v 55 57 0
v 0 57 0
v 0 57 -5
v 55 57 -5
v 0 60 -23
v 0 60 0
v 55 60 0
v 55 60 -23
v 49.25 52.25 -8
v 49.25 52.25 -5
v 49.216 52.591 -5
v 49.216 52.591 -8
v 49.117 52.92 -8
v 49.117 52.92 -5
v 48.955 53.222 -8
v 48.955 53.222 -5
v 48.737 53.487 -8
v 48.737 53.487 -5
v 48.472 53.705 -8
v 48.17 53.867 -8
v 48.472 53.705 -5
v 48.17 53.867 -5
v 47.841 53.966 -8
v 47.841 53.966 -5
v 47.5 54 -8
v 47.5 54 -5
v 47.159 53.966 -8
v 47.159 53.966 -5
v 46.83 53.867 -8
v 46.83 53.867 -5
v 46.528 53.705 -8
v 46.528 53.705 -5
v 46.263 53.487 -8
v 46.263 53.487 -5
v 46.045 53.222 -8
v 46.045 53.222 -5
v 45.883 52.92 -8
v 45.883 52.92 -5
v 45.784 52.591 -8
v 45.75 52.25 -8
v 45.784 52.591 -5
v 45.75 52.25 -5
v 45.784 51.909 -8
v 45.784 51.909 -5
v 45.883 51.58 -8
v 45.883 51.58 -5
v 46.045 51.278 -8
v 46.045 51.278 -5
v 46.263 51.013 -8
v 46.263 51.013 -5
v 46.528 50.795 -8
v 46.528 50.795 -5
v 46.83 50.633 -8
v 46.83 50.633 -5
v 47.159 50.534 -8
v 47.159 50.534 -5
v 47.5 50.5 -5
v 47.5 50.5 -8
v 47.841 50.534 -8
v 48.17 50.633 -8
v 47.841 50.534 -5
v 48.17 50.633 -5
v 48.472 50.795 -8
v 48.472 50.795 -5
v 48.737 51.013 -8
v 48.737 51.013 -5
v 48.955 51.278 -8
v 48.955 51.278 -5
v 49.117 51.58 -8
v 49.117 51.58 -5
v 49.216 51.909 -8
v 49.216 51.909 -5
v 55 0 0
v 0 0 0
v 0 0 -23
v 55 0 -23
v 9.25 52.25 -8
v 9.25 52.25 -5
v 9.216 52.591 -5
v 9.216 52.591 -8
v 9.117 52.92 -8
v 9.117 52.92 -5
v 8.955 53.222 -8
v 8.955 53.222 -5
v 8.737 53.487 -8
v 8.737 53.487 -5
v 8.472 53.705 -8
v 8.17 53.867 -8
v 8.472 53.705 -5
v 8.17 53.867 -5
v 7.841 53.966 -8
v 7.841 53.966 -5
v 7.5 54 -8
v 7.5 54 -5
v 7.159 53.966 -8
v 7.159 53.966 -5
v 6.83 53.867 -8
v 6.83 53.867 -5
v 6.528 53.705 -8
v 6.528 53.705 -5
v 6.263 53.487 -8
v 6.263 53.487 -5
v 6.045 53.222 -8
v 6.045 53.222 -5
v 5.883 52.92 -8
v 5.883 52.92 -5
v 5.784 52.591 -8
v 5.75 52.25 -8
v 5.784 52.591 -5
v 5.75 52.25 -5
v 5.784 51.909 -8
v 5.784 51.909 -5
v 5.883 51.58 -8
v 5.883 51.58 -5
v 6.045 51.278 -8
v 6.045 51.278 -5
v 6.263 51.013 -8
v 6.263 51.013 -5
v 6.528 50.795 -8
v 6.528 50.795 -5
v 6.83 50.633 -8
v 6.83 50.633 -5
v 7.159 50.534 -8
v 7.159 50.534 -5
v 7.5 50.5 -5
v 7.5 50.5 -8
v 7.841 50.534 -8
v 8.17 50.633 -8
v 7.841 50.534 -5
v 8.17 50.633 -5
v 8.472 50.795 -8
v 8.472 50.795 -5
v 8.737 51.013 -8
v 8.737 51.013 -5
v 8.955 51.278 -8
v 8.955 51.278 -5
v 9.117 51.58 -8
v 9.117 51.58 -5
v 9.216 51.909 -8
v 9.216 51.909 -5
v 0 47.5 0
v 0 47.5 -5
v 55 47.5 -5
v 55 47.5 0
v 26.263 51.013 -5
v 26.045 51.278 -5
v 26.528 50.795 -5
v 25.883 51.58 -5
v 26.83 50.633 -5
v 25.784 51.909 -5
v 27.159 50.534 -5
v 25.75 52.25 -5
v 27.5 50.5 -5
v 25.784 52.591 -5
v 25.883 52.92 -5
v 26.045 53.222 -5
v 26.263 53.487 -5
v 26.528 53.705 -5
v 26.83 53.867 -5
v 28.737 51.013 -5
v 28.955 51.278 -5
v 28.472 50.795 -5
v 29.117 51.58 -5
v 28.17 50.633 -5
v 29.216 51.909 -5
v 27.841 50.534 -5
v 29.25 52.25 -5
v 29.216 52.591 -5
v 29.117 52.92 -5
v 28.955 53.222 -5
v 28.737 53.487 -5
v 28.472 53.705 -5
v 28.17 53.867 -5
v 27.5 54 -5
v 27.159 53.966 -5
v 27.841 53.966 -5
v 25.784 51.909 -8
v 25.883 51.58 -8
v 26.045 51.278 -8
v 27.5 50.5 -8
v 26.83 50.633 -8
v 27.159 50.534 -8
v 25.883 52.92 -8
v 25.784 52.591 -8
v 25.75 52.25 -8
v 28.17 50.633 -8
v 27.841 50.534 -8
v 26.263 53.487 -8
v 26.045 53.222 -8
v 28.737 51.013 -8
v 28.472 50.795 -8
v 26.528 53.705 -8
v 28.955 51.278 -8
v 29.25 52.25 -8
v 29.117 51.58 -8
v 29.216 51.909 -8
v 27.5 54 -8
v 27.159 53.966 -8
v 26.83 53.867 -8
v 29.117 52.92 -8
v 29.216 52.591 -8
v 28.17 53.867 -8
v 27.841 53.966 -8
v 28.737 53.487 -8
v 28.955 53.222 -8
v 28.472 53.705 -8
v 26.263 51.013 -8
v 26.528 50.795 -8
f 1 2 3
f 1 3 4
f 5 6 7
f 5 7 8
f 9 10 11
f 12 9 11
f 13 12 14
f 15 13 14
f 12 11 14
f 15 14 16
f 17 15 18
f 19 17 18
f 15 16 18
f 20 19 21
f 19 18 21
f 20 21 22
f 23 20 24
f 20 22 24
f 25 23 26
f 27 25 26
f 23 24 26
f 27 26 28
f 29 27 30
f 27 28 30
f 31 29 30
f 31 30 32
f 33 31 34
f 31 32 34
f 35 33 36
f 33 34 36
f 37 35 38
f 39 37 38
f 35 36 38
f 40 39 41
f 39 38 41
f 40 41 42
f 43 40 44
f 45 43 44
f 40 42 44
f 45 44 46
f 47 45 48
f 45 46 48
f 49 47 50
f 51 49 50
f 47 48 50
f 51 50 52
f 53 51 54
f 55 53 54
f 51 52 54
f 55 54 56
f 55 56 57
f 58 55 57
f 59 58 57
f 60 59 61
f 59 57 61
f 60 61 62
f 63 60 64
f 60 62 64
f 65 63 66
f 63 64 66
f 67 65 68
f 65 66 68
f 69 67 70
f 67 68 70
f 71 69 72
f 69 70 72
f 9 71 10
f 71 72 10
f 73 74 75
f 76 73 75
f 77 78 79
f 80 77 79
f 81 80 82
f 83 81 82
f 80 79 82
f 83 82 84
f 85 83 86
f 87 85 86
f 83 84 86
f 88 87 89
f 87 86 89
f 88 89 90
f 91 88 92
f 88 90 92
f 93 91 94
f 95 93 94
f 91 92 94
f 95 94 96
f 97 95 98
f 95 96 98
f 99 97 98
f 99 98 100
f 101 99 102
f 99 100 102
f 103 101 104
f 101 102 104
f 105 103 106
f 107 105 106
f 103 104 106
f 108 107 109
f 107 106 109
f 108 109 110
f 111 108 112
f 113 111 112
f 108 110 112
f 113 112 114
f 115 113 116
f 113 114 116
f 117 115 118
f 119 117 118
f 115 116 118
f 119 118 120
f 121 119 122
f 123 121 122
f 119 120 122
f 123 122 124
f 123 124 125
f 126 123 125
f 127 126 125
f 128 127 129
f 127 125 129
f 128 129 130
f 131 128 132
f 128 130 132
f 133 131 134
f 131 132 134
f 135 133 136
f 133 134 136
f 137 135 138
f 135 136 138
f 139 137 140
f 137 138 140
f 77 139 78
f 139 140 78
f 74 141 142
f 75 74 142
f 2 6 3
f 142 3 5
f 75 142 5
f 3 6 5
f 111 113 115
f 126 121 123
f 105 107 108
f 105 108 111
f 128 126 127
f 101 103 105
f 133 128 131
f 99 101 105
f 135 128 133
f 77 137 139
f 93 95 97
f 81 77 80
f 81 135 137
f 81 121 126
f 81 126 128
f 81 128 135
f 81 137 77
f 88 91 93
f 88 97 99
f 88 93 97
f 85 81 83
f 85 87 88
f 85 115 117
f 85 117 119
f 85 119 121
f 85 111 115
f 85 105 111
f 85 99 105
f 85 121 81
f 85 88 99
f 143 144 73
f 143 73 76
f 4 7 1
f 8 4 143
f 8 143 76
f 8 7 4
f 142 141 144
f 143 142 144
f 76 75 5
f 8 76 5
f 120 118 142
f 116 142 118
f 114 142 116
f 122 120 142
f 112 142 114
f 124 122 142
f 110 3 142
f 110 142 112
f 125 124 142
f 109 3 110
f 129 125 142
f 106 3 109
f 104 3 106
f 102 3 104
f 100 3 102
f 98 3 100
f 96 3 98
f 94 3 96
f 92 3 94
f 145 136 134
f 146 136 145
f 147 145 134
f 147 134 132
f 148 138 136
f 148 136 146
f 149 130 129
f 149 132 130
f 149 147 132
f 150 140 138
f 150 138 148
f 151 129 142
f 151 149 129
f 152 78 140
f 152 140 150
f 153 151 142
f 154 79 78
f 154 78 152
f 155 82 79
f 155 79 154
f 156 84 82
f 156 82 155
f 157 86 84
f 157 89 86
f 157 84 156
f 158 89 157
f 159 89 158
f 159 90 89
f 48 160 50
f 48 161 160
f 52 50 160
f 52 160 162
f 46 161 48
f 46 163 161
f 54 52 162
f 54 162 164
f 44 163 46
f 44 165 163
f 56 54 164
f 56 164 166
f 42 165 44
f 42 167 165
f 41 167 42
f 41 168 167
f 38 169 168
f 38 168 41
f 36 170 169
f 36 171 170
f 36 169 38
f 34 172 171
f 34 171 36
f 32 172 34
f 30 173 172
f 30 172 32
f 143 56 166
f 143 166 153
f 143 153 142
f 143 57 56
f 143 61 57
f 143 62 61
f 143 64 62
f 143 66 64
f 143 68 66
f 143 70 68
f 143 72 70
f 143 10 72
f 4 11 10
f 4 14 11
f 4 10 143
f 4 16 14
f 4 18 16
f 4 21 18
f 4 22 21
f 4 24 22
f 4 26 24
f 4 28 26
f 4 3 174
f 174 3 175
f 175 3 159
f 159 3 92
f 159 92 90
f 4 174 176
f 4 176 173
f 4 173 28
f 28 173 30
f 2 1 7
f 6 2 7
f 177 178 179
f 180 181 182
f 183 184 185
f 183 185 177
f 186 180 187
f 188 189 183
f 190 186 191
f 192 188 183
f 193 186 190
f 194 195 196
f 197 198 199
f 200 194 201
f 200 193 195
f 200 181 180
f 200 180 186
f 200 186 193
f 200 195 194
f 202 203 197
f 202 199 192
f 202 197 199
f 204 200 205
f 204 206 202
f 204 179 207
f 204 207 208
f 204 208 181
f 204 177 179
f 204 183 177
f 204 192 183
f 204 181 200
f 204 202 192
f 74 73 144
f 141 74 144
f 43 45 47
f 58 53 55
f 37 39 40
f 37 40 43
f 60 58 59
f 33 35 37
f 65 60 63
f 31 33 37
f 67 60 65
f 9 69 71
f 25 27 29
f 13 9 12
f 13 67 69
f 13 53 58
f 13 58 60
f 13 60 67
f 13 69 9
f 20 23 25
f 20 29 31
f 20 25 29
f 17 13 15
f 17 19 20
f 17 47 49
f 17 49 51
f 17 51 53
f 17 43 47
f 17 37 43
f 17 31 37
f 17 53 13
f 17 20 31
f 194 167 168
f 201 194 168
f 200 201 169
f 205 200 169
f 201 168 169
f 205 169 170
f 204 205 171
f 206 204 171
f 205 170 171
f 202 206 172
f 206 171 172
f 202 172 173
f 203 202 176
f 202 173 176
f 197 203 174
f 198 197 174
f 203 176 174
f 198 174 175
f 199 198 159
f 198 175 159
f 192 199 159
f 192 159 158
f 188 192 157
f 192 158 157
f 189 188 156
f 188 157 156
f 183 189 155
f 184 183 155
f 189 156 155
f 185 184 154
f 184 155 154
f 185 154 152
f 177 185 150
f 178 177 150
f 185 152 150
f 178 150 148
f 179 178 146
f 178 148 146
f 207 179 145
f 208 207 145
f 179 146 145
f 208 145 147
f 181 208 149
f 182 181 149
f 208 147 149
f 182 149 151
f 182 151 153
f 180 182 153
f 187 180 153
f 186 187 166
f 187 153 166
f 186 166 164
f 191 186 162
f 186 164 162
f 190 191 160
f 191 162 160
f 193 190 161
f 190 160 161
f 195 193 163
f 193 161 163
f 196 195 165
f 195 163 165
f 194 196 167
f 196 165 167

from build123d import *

# Parameters (mm, degrees)
SKETCH1_W           = 23
SKETCH1_H           = 60
BOSS_EXTRUDE1_DEPTH = 55
SKETCH2_W           = 55
SKETCH2_H           = 9.5
CUT_EXTRUDE1_DEPTH  = 5
SKETCH3_R           = 1.75
CUT_EXTRUDE2_DEPTH  = 3


with BuildPart() as part:
    # Sketch1 → Boss-Extrude1 (new body)
    with BuildSketch(Plane(origin=(0, 0, 0), x_dir=(0, 0, -1), z_dir=(1, 0, 0))):
        with Locations((11.5, 30)):
            Rectangle(SKETCH1_W, SKETCH1_H)
    extrude(amount=BOSS_EXTRUDE1_DEPTH)

    # Sketch2 → Cut-Extrude1 (cut)
    with BuildSketch(Plane.XY):
        with Locations((27.5, 52.25)):
            Rectangle(SKETCH2_W, SKETCH2_H)
    extrude(amount=-CUT_EXTRUDE1_DEPTH, mode=Mode.SUBTRACT)

    # Sketch3 → Cut-Extrude2 (cut)
    with BuildSketch(Plane.XY.offset(-5)):
        with Locations((7.5, 52.25)):
            Circle(SKETCH3_R)
        with Locations((27.5, 52.25)):
            Circle(SKETCH3_R)
        with Locations((47.5, 52.25)):
            Circle(SKETCH3_R)
    extrude(amount=-CUT_EXTRUDE2_DEPTH, mode=Mode.SUBTRACT)


solid = part.part
